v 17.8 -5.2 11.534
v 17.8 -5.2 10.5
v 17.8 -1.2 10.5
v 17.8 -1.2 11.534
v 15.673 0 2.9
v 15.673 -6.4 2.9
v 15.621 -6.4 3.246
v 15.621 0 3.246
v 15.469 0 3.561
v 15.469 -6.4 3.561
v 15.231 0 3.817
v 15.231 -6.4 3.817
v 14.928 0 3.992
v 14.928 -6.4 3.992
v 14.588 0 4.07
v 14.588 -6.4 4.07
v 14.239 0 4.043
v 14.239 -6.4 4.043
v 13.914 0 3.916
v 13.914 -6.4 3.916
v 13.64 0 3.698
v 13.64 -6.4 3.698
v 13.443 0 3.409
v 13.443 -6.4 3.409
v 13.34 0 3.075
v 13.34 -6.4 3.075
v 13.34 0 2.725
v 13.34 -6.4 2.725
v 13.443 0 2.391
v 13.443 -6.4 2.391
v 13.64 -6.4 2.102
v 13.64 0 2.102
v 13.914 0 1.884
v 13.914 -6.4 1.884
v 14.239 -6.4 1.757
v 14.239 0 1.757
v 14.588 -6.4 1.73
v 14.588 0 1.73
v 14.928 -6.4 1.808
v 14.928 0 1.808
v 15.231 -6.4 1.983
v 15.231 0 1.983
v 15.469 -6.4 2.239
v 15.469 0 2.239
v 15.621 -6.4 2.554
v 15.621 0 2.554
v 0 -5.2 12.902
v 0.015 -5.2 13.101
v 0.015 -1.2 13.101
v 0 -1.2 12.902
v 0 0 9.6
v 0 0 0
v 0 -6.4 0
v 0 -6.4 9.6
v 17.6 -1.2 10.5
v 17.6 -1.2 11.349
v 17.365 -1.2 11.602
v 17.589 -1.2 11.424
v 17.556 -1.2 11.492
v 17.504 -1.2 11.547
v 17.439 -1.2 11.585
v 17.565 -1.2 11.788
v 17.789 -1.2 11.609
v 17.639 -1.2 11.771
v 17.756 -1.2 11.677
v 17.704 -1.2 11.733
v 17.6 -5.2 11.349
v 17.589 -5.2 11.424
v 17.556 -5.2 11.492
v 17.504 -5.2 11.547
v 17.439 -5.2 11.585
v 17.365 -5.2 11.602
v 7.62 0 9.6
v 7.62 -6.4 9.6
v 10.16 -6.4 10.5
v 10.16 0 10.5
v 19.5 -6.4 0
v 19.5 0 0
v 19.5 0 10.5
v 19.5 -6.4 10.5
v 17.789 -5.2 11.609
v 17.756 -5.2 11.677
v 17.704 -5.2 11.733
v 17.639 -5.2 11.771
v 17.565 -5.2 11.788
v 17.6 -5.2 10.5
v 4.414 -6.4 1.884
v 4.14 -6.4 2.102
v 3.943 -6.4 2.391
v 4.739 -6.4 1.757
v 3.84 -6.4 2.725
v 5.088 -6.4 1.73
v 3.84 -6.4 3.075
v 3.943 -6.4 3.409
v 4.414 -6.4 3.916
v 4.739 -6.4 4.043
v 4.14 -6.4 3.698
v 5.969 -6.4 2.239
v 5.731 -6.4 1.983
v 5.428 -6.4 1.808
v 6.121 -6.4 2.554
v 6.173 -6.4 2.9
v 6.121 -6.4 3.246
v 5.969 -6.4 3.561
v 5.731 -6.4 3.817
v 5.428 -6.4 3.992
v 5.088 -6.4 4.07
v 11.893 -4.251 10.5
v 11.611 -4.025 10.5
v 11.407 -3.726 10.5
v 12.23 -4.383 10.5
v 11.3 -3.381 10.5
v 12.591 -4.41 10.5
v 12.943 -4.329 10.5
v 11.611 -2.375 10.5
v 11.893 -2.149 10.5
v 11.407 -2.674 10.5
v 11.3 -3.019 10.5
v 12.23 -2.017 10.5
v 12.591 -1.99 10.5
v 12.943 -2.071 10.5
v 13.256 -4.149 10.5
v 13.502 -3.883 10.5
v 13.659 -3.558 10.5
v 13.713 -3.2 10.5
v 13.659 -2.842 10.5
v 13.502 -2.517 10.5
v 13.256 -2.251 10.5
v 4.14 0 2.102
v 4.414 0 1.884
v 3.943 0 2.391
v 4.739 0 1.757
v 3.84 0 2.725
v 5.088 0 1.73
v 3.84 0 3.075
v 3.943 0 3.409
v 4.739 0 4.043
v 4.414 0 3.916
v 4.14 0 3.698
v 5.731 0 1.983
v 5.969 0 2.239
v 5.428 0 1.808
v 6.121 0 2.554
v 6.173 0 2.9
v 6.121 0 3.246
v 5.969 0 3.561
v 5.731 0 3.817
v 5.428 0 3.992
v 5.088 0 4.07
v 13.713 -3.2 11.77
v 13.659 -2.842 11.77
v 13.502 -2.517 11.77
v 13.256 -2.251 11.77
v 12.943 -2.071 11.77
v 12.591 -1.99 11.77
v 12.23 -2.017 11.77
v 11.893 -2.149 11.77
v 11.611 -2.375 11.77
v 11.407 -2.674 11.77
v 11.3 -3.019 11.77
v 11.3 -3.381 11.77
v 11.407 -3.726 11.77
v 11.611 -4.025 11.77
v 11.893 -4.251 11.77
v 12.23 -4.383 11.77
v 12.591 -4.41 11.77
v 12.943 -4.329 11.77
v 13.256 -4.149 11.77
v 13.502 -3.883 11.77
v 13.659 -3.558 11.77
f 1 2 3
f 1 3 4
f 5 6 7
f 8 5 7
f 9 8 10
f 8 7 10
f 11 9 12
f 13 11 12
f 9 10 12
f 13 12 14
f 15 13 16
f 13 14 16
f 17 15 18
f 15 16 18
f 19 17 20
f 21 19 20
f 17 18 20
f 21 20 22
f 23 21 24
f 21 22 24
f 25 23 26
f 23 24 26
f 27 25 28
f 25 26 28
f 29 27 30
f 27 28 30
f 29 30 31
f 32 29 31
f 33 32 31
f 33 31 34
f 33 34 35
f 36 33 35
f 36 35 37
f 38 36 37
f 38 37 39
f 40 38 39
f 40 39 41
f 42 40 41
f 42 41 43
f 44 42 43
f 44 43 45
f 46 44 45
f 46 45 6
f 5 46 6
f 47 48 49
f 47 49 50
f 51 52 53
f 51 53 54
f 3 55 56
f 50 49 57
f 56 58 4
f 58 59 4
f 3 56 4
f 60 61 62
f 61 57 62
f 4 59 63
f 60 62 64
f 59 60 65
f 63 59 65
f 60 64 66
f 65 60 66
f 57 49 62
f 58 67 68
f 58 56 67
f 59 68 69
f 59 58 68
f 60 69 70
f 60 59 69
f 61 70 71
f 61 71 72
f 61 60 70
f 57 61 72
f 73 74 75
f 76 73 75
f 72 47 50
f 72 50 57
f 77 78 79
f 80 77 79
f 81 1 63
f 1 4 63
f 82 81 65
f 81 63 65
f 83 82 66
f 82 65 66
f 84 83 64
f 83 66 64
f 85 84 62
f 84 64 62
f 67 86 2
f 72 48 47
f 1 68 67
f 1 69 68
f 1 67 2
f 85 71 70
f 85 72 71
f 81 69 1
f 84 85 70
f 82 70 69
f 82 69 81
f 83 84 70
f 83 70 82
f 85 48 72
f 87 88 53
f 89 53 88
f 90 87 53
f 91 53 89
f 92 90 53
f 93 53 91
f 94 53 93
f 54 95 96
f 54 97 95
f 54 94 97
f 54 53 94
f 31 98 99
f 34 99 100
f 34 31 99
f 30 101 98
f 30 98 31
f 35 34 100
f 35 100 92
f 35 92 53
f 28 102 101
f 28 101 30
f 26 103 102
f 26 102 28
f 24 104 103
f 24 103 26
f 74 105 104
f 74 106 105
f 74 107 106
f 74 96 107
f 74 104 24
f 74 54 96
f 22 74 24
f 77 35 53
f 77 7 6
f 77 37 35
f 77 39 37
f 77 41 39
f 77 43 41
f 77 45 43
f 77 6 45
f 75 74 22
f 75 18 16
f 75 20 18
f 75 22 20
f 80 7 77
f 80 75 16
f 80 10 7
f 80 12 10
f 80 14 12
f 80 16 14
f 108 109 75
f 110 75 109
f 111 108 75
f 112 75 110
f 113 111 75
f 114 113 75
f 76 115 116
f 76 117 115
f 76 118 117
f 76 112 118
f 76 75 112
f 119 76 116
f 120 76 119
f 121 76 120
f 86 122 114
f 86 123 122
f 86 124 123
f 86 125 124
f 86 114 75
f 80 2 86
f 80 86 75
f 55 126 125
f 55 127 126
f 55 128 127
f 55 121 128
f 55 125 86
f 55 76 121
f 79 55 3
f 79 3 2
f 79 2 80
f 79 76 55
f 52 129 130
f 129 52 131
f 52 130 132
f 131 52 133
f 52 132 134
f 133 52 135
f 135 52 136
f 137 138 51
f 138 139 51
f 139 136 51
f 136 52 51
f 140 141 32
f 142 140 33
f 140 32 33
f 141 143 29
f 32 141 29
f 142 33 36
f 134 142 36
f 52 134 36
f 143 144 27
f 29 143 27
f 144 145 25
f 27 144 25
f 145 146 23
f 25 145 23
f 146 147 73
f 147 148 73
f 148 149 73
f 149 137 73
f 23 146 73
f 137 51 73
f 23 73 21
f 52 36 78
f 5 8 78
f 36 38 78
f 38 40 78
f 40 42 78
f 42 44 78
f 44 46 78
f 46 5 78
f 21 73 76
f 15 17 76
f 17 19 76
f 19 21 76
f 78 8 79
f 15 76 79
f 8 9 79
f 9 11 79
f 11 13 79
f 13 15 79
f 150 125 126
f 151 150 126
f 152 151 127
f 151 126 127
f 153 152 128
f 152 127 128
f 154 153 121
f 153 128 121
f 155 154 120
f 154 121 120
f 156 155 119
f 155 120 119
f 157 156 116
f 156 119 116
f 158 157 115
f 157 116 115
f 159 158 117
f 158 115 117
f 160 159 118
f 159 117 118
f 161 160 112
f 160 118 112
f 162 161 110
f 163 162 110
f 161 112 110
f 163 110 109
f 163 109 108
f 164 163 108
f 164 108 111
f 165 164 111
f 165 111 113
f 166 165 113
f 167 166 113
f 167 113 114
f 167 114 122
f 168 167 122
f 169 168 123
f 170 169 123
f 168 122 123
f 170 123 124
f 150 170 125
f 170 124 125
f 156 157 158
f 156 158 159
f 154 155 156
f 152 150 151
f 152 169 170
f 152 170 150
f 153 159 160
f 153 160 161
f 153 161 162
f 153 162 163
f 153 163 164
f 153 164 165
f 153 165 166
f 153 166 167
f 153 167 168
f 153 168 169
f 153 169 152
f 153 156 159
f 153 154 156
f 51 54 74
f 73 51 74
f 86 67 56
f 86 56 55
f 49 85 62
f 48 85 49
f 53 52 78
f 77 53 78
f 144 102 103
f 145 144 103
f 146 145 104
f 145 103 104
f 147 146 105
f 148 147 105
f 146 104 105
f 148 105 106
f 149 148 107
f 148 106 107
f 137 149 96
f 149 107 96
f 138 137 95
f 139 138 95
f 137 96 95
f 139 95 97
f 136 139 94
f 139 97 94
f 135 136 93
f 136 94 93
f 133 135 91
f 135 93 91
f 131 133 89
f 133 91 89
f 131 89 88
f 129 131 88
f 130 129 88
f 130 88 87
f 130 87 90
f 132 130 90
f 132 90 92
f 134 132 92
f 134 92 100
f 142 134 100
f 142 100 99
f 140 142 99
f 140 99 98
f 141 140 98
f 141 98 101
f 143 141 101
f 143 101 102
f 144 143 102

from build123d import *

# Parameters (mm, degrees)
F0_W      = 19.5
F0_H      = 10.5
F1_DEPTH  = 6.4
F2_R      = 1.1728484487
F3_DEPTH  = 25.4
F5_DEPTH  = 25.4
F6_R      = 1.2132701797
F7_DEPTH  = 1.27
F10_DEPTH = 4
F11_R     = 0.254


with BuildPart() as f1:
    # F0 (on Front) → F1 (new body)
    with BuildSketch(Plane.XZ):
        with Locations((9.75, 5.25)):
            Rectangle(F0_W, F0_H)
    extrude(amount=F1_DEPTH)

    # F2 (on face) → F3 (cut)
    with BuildSketch(Plane.XZ.offset(6.4)):
        with Locations((5, 2.9)):
            Circle(F2_R)
        with Locations((14.5, 2.9)):
            Circle(F2_R)
    extrude(amount=-F3_DEPTH, mode=Mode.SUBTRACT)

    # F4 (on face) → F5 (cut)
    with BuildSketch(Plane.XZ.offset(6.4)):
        Polygon((10.16, 10.5), (0, 10.5), (0, 9.6), (7.62, 9.6), align=None)
    extrude(amount=-F5_DEPTH, mode=Mode.SUBTRACT)

    # F6 (on face) → F7 (join)
    with BuildSketch(Plane.XY.offset(10.5)):
        with Locations((12.5, -3.2)):
            Circle(F6_R)
    extrude(amount=F7_DEPTH)

    # F9 (on offset) → F10 (join)
    with BuildSketch(Plane.XZ.offset(5.2)):
        Polygon((17.6, 11.5844129181), (17.6, 10.5), (17.8, 10.5), (17.8, 11.77), (0.0149307994, 13.1014418994), (0, 12.902), align=None)
    extrude(amount=-F10_DEPTH)

    # F11
    f11_edges = [f1.edges().sort_by_distance(p)[0] for p in [
        (17.8, -3.2, 11.77),
        (17.6, -3.2, 11.584413),
    ]]
    fillet(f11_edges, radius=F11_R)


solid = f1.part
